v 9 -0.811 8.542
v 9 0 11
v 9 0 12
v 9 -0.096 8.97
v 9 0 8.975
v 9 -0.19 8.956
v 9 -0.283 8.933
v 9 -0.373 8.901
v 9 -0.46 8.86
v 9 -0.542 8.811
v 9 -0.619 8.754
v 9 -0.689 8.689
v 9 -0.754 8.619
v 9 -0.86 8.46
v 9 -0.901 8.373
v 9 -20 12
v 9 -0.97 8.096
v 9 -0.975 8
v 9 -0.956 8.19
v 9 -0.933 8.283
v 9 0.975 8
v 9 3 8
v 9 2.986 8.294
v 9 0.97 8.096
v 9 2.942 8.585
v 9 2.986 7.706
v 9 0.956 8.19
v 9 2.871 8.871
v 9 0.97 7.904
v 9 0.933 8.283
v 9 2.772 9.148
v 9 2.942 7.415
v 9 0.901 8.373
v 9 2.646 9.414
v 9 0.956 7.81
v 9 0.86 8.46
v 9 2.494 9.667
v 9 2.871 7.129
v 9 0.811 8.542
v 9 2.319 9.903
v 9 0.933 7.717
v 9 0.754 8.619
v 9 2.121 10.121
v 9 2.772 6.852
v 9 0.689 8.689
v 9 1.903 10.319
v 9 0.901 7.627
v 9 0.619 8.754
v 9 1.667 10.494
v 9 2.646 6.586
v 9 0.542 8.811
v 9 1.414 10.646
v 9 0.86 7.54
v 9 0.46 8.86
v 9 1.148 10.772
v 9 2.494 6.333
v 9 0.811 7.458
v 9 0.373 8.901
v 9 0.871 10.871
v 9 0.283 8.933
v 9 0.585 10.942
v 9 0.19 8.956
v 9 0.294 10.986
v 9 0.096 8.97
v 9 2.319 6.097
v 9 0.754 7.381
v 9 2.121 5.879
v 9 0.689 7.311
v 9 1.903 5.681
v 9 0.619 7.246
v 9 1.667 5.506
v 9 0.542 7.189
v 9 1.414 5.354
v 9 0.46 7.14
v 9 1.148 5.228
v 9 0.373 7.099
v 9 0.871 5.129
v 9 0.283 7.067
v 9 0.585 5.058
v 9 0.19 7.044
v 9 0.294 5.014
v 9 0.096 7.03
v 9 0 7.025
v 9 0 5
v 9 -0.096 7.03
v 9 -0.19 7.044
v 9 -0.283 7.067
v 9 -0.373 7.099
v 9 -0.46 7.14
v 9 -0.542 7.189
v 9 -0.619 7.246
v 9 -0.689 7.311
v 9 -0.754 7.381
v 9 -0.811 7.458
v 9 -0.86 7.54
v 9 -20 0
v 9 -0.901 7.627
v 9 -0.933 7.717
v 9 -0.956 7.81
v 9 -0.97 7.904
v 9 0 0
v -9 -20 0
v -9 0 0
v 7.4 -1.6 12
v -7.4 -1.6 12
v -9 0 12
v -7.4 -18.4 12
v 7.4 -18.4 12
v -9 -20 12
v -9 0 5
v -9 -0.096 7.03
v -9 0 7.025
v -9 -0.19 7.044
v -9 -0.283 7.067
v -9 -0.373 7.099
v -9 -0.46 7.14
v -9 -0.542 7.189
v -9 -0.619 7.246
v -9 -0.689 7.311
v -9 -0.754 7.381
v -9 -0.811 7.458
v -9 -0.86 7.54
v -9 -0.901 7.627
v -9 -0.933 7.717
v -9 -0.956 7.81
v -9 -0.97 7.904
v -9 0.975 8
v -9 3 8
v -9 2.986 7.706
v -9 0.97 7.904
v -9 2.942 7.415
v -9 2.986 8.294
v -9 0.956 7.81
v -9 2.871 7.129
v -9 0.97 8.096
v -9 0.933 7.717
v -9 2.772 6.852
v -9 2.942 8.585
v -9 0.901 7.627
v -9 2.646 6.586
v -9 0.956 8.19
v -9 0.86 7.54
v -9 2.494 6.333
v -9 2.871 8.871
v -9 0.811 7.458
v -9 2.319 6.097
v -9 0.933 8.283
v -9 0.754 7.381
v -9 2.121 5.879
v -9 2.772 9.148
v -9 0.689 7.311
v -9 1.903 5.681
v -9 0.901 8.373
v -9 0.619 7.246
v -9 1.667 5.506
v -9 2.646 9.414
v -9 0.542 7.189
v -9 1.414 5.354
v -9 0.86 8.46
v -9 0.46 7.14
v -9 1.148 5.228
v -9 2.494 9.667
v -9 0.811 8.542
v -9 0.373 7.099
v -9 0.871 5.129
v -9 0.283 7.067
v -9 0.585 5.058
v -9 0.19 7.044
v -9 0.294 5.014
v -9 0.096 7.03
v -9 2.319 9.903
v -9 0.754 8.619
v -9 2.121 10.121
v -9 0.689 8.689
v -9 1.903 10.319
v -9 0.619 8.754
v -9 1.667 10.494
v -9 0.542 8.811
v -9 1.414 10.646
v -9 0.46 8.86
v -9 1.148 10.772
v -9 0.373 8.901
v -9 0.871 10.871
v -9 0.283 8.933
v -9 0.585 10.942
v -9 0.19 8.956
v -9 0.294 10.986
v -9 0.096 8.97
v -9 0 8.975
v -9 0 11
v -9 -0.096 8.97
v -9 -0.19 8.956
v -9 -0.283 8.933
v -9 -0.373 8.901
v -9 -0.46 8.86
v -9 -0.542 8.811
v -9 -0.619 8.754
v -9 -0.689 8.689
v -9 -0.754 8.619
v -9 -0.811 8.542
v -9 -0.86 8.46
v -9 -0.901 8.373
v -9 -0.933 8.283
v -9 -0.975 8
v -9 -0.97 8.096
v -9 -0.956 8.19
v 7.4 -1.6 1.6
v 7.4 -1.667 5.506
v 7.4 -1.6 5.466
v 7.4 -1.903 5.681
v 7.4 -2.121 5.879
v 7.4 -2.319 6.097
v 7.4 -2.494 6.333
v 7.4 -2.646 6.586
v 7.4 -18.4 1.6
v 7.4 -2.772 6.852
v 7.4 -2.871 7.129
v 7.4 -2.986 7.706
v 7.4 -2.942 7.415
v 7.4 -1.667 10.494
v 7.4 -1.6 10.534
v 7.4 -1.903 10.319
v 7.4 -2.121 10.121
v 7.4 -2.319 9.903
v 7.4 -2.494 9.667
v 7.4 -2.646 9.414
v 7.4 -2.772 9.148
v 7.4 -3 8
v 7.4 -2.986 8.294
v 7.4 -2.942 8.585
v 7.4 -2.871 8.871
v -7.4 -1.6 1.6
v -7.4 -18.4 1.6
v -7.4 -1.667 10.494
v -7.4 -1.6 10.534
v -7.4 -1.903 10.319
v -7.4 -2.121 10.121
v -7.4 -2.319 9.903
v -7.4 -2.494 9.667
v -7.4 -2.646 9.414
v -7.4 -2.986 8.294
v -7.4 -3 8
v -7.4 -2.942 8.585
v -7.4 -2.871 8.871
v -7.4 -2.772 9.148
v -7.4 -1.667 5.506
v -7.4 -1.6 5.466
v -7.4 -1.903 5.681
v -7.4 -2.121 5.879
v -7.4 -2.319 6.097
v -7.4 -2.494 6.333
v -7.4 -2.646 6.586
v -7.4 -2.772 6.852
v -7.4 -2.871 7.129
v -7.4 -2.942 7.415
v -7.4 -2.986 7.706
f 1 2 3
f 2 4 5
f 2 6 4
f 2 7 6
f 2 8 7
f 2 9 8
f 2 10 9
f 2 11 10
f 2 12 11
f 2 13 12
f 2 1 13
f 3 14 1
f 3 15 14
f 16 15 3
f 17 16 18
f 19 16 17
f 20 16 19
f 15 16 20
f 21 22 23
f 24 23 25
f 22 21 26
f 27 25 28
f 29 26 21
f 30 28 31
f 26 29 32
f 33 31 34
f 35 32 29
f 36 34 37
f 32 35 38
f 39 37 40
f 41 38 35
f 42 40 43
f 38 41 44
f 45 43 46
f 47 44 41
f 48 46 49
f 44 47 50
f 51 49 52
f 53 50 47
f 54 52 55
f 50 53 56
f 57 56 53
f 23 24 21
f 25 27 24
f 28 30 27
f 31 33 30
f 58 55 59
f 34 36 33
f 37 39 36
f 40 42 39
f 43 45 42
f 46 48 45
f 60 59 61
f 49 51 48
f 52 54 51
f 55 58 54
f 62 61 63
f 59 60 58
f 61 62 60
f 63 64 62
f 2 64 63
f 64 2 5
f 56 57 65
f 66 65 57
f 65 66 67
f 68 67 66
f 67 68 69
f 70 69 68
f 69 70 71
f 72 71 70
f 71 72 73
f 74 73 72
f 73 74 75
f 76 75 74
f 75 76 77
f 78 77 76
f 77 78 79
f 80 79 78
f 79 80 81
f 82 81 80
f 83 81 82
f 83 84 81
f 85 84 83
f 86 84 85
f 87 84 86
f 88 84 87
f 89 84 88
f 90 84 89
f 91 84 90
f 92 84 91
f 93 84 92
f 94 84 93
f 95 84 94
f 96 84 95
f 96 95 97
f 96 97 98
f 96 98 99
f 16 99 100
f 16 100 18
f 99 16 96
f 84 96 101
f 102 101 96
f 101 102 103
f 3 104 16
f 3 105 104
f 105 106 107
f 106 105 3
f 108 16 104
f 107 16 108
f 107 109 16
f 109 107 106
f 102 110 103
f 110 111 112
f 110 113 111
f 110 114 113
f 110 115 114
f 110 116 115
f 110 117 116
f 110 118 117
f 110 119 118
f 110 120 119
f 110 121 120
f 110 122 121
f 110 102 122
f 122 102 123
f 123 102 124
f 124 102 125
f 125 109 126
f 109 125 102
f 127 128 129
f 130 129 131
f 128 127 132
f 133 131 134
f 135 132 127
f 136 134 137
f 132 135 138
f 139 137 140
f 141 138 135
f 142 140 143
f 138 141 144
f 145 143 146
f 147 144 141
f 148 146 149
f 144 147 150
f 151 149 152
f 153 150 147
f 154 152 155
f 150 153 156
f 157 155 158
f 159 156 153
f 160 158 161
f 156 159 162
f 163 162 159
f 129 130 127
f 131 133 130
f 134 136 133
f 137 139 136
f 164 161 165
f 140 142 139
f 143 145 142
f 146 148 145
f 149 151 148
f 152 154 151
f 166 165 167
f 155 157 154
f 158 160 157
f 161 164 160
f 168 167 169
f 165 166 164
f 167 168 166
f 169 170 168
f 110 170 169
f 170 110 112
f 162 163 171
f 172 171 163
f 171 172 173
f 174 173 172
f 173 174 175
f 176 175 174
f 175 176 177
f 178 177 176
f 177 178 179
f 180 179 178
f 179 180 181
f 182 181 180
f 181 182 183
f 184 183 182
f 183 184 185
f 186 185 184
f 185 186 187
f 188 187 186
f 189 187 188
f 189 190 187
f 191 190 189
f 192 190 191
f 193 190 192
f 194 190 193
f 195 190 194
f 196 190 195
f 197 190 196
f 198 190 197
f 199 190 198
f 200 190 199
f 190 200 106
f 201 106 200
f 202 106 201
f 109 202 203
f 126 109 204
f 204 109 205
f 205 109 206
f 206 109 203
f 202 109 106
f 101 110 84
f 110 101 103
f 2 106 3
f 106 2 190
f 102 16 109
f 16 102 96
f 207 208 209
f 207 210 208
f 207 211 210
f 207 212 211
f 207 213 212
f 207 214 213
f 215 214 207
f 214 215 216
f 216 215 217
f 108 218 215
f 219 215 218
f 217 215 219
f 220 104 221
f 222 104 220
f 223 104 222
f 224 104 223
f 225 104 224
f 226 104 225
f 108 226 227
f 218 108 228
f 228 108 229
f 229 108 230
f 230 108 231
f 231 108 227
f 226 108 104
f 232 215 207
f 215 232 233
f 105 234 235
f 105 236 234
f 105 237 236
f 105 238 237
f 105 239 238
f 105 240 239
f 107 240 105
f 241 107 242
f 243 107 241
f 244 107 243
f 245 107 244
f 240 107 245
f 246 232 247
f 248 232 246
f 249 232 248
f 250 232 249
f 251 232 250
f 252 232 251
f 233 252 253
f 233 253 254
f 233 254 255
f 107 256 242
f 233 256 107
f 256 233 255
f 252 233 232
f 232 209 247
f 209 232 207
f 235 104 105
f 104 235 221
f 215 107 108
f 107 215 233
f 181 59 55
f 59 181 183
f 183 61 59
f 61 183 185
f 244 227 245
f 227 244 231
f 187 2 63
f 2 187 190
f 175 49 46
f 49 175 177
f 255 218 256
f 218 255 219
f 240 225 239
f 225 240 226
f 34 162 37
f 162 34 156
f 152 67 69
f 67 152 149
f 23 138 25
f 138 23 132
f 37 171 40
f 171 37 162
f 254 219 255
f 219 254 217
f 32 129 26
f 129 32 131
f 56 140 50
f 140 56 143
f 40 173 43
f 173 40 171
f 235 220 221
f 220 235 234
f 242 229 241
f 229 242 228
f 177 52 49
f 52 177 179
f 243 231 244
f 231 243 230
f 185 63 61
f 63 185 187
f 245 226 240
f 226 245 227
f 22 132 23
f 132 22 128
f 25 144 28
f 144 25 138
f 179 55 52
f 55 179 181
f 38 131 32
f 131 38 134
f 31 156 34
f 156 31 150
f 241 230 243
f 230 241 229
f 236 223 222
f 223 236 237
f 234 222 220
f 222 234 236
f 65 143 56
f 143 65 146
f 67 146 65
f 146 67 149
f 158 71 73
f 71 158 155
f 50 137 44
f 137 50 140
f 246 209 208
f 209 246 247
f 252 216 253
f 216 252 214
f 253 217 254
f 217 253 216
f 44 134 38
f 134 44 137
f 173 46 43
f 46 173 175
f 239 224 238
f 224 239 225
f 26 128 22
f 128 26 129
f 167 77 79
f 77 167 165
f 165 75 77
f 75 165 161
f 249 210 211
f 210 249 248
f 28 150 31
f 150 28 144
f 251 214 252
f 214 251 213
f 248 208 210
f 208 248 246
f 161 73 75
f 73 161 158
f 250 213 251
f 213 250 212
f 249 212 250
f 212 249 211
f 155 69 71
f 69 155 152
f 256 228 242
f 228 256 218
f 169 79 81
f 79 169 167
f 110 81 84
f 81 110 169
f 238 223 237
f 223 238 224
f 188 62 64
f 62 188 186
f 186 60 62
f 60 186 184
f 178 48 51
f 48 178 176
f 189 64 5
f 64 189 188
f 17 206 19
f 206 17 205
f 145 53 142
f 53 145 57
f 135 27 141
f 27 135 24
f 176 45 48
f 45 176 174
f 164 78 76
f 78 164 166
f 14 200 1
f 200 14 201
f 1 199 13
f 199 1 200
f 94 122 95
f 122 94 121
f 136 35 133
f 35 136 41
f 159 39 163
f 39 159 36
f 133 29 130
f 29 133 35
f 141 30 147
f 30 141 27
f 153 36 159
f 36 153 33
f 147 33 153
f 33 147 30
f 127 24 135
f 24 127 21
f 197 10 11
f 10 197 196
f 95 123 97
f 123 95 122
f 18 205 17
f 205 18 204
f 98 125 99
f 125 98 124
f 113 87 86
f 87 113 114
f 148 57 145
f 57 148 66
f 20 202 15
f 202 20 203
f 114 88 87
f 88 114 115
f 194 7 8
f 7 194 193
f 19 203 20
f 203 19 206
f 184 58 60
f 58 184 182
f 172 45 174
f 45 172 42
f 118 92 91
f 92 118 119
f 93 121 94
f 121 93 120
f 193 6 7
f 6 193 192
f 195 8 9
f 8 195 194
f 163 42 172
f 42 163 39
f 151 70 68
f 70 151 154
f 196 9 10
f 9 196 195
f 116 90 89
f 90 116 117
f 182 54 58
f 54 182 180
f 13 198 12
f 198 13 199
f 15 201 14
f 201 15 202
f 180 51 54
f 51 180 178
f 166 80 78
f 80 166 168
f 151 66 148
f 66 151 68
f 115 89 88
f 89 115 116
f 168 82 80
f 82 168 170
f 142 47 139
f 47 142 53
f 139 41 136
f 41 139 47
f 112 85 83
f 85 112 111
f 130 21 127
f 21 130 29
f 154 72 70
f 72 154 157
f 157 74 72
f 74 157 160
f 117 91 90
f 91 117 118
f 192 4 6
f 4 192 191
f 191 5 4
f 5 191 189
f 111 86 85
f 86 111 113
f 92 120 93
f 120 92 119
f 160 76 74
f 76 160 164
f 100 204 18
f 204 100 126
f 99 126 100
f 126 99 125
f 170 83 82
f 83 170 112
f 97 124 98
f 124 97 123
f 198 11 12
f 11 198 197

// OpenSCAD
// Dummy flip cover for the covered buttons on the replica, hinged on a 1.75 mm
// filament pin, for the cover-opening check. Print 2, top on the bed.
include <../cad/params.scad>
include <../cad/lib.scad>

wall = 1.6;

module alarm_cover() {
    pin_z = cover_pin_z;
    difference() {
        union() {
            difference() {
                box(-cover_w / 2, cover_w / 2, -cover_d, 0, 0, cover_h);
                box(-cover_w / 2 + wall, cover_w / 2 - wall, -cover_d + wall, -wall, -1, cover_h - wall);
            }
            // hinge knuckle
            translate([-cover_w / 2, 0, pin_z]) rotate([0, 90, 0]) cylinder(r = 3, h = cover_w);
        }
        translate([-cover_w / 2 - 1, 0, pin_z]) rotate([0, 90, 0]) cylinder(d = 1.95, h = cover_w + 2);
    }
}

translate([0, 0, cover_h]) mirror([0, 0, 1]) alarm_cover();
